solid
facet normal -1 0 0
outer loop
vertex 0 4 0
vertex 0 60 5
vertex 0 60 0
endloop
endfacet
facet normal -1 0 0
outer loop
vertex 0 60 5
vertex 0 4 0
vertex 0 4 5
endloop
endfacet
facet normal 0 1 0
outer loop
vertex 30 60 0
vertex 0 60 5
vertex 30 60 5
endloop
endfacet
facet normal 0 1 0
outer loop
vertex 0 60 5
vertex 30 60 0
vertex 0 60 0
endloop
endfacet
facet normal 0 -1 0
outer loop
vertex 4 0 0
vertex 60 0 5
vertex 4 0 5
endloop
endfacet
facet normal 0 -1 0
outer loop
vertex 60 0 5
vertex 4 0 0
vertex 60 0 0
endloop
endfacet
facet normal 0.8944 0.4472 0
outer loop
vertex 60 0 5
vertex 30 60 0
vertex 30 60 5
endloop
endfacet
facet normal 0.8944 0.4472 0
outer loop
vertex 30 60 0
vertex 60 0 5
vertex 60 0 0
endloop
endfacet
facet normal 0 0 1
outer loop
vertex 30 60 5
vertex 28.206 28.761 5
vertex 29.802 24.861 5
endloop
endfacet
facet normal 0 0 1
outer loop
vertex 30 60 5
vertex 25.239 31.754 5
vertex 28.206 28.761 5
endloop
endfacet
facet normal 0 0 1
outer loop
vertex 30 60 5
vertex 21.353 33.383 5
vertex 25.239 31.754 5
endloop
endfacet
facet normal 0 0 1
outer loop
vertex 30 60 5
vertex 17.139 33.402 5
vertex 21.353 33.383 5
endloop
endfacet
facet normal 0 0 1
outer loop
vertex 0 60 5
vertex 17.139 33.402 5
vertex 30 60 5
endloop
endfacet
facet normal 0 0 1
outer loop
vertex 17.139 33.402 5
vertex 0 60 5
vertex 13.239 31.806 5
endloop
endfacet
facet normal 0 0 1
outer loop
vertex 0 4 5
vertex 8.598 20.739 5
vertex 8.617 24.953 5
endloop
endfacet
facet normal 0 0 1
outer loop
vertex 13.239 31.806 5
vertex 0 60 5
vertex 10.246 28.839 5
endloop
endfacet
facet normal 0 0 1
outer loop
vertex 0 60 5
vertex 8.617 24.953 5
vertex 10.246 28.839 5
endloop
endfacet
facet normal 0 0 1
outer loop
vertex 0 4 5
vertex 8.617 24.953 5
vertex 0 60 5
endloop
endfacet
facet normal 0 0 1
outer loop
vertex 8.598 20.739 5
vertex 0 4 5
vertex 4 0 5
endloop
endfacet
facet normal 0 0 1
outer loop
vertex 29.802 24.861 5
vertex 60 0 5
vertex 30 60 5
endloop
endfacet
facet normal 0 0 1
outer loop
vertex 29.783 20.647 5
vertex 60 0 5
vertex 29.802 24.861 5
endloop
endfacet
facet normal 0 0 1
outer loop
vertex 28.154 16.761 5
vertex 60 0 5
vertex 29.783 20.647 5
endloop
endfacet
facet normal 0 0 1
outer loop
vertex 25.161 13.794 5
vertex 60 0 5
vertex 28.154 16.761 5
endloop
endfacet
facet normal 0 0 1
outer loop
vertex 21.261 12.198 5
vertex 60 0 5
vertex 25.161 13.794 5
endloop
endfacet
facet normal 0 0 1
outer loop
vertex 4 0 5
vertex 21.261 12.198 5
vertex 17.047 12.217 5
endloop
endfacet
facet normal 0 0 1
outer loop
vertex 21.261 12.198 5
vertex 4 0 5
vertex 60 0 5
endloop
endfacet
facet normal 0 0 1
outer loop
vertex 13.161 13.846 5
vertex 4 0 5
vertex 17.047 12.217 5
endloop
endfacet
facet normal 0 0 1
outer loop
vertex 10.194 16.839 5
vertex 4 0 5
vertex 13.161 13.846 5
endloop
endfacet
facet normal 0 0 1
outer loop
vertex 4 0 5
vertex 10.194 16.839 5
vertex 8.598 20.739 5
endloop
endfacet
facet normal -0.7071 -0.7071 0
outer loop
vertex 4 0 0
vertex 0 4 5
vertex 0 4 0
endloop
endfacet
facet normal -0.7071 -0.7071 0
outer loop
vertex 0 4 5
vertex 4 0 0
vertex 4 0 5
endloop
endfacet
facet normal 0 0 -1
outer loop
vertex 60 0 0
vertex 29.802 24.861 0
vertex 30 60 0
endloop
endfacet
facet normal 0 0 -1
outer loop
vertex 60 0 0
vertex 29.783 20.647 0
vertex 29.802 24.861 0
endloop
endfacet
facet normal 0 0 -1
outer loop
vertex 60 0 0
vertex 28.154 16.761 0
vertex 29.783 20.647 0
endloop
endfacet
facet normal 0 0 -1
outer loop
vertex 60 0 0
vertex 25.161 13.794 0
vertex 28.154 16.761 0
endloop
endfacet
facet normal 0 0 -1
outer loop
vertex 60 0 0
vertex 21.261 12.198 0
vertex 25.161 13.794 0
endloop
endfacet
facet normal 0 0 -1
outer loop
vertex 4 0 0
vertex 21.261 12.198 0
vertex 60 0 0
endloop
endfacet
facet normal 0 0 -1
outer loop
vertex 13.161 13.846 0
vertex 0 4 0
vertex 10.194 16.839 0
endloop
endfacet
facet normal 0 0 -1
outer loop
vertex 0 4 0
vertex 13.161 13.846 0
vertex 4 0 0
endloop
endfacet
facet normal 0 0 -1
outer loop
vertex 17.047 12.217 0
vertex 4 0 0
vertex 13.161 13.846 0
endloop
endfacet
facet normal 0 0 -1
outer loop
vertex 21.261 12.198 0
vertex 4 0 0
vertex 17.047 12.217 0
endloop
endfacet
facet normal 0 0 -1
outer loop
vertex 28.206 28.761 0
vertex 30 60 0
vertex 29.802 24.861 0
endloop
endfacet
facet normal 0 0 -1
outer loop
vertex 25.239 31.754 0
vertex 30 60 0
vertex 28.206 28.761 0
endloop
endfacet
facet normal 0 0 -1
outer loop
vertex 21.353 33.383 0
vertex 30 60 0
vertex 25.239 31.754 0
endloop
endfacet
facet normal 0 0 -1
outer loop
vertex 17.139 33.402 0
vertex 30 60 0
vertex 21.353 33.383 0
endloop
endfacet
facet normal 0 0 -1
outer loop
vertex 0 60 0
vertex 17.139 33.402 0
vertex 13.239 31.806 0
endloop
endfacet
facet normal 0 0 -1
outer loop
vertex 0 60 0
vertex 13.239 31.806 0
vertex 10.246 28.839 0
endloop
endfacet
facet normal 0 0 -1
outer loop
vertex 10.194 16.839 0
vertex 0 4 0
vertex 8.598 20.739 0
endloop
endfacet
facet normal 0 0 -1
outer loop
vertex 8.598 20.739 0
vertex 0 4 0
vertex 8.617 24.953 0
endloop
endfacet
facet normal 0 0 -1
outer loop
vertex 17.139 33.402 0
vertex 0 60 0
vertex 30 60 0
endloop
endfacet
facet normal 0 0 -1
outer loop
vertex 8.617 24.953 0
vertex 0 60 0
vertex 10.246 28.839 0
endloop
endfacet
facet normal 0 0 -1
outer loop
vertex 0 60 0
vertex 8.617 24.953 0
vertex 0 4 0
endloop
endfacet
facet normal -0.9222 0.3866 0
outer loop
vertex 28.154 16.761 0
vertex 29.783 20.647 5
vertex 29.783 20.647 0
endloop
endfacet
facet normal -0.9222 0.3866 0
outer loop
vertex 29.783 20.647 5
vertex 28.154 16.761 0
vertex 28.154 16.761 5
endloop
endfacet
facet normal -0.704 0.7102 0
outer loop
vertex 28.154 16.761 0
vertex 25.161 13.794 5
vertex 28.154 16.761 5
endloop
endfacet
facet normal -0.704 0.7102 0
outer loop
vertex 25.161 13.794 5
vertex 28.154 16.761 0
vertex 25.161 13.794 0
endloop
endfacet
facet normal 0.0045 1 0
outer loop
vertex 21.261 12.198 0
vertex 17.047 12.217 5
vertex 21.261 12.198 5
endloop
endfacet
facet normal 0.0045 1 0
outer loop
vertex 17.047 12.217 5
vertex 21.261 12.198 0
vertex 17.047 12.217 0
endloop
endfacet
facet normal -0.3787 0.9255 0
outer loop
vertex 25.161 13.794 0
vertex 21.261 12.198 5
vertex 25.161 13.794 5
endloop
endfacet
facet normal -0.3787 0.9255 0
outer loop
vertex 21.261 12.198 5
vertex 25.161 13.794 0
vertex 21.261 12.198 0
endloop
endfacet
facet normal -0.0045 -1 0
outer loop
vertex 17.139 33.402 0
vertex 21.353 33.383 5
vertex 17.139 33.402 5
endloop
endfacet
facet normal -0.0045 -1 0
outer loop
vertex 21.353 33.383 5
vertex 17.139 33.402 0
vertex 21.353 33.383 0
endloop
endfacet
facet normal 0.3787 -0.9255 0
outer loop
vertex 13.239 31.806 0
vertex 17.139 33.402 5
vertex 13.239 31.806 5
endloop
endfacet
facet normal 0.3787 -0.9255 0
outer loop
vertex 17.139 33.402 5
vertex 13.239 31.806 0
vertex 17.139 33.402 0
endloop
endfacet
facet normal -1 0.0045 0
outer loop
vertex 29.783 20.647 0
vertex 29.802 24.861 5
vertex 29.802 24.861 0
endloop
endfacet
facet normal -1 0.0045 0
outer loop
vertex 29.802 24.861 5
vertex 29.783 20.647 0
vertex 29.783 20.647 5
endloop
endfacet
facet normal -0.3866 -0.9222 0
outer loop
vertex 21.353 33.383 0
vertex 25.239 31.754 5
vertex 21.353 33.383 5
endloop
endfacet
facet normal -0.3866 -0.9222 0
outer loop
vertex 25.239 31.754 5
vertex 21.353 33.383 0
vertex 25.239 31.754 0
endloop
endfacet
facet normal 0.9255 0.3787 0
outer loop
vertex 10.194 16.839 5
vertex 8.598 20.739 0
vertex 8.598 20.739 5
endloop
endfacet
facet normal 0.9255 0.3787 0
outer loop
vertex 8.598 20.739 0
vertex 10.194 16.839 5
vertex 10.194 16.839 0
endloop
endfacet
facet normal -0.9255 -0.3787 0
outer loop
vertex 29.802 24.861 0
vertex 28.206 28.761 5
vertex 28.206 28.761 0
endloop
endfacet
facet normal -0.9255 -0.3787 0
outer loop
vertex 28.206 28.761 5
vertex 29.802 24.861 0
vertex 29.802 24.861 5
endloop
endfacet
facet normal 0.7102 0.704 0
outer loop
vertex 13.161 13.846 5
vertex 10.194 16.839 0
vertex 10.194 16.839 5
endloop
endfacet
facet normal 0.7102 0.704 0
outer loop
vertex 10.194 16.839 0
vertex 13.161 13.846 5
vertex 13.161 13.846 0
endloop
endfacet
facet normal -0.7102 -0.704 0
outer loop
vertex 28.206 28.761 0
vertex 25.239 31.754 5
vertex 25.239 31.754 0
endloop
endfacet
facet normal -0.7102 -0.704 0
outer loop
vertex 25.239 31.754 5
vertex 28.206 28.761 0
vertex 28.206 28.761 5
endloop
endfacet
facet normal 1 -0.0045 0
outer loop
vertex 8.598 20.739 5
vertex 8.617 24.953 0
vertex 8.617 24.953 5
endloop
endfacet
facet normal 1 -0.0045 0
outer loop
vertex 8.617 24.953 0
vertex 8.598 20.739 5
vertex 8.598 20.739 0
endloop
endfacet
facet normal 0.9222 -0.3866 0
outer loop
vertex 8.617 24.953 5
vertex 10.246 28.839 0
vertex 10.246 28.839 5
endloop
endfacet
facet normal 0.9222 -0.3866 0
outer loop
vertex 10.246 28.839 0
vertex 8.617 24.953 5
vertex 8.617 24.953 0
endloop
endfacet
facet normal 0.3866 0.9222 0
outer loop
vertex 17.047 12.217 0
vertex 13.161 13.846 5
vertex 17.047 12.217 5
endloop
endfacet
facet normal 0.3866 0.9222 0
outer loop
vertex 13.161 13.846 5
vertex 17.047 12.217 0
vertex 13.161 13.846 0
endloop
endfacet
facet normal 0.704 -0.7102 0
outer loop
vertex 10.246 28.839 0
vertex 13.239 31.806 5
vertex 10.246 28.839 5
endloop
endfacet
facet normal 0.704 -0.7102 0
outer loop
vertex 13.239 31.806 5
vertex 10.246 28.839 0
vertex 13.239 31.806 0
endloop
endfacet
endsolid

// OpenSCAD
$fn = 32;

// ----------------------------------------------------------------------
// Bracket plate: gusset 60 x 60
// ----------------------------------------------------------------------

// --- parameters (mm) ---
hole_r = 4;               // bolt hole radius
plate_t = 5;              // plate thickness, Z (extrusion height)
gus_a = 60;               // base length
gus_b = 60;               // height
top_x = 30;               // top edge X of the angled cut
light_r = 10.8;           // lightening hole radius

light_d = 2 * light_r;

profile = [[4, 0], [30, 0], [60, 0], [30, 60], [0, 60], [0, 4]];  // primary outline, 6 points, counter clockwise
void_1 = [[29.802, 24.861], [28.206, 28.761], [25.239, 31.754], [21.353, 33.383], [17.139, 33.402], [13.239, 31.806], [10.246, 28.839], [8.617, 24.953], [8.598, 20.739], [10.194, 16.839], [13.161, 13.846], [17.047, 12.217], [21.261, 12.198], [25.161, 13.794], [28.154, 16.761], [29.783, 20.647]];  // lightening hole, 16 points

// --- the one profile operation ---
difference() {
  linear_extrude(height = plate_t) polygon(points = profile);
  translate([0, 0, -1])
    linear_extrude(height = plate_t + 2) polygon(points = void_1);
}
